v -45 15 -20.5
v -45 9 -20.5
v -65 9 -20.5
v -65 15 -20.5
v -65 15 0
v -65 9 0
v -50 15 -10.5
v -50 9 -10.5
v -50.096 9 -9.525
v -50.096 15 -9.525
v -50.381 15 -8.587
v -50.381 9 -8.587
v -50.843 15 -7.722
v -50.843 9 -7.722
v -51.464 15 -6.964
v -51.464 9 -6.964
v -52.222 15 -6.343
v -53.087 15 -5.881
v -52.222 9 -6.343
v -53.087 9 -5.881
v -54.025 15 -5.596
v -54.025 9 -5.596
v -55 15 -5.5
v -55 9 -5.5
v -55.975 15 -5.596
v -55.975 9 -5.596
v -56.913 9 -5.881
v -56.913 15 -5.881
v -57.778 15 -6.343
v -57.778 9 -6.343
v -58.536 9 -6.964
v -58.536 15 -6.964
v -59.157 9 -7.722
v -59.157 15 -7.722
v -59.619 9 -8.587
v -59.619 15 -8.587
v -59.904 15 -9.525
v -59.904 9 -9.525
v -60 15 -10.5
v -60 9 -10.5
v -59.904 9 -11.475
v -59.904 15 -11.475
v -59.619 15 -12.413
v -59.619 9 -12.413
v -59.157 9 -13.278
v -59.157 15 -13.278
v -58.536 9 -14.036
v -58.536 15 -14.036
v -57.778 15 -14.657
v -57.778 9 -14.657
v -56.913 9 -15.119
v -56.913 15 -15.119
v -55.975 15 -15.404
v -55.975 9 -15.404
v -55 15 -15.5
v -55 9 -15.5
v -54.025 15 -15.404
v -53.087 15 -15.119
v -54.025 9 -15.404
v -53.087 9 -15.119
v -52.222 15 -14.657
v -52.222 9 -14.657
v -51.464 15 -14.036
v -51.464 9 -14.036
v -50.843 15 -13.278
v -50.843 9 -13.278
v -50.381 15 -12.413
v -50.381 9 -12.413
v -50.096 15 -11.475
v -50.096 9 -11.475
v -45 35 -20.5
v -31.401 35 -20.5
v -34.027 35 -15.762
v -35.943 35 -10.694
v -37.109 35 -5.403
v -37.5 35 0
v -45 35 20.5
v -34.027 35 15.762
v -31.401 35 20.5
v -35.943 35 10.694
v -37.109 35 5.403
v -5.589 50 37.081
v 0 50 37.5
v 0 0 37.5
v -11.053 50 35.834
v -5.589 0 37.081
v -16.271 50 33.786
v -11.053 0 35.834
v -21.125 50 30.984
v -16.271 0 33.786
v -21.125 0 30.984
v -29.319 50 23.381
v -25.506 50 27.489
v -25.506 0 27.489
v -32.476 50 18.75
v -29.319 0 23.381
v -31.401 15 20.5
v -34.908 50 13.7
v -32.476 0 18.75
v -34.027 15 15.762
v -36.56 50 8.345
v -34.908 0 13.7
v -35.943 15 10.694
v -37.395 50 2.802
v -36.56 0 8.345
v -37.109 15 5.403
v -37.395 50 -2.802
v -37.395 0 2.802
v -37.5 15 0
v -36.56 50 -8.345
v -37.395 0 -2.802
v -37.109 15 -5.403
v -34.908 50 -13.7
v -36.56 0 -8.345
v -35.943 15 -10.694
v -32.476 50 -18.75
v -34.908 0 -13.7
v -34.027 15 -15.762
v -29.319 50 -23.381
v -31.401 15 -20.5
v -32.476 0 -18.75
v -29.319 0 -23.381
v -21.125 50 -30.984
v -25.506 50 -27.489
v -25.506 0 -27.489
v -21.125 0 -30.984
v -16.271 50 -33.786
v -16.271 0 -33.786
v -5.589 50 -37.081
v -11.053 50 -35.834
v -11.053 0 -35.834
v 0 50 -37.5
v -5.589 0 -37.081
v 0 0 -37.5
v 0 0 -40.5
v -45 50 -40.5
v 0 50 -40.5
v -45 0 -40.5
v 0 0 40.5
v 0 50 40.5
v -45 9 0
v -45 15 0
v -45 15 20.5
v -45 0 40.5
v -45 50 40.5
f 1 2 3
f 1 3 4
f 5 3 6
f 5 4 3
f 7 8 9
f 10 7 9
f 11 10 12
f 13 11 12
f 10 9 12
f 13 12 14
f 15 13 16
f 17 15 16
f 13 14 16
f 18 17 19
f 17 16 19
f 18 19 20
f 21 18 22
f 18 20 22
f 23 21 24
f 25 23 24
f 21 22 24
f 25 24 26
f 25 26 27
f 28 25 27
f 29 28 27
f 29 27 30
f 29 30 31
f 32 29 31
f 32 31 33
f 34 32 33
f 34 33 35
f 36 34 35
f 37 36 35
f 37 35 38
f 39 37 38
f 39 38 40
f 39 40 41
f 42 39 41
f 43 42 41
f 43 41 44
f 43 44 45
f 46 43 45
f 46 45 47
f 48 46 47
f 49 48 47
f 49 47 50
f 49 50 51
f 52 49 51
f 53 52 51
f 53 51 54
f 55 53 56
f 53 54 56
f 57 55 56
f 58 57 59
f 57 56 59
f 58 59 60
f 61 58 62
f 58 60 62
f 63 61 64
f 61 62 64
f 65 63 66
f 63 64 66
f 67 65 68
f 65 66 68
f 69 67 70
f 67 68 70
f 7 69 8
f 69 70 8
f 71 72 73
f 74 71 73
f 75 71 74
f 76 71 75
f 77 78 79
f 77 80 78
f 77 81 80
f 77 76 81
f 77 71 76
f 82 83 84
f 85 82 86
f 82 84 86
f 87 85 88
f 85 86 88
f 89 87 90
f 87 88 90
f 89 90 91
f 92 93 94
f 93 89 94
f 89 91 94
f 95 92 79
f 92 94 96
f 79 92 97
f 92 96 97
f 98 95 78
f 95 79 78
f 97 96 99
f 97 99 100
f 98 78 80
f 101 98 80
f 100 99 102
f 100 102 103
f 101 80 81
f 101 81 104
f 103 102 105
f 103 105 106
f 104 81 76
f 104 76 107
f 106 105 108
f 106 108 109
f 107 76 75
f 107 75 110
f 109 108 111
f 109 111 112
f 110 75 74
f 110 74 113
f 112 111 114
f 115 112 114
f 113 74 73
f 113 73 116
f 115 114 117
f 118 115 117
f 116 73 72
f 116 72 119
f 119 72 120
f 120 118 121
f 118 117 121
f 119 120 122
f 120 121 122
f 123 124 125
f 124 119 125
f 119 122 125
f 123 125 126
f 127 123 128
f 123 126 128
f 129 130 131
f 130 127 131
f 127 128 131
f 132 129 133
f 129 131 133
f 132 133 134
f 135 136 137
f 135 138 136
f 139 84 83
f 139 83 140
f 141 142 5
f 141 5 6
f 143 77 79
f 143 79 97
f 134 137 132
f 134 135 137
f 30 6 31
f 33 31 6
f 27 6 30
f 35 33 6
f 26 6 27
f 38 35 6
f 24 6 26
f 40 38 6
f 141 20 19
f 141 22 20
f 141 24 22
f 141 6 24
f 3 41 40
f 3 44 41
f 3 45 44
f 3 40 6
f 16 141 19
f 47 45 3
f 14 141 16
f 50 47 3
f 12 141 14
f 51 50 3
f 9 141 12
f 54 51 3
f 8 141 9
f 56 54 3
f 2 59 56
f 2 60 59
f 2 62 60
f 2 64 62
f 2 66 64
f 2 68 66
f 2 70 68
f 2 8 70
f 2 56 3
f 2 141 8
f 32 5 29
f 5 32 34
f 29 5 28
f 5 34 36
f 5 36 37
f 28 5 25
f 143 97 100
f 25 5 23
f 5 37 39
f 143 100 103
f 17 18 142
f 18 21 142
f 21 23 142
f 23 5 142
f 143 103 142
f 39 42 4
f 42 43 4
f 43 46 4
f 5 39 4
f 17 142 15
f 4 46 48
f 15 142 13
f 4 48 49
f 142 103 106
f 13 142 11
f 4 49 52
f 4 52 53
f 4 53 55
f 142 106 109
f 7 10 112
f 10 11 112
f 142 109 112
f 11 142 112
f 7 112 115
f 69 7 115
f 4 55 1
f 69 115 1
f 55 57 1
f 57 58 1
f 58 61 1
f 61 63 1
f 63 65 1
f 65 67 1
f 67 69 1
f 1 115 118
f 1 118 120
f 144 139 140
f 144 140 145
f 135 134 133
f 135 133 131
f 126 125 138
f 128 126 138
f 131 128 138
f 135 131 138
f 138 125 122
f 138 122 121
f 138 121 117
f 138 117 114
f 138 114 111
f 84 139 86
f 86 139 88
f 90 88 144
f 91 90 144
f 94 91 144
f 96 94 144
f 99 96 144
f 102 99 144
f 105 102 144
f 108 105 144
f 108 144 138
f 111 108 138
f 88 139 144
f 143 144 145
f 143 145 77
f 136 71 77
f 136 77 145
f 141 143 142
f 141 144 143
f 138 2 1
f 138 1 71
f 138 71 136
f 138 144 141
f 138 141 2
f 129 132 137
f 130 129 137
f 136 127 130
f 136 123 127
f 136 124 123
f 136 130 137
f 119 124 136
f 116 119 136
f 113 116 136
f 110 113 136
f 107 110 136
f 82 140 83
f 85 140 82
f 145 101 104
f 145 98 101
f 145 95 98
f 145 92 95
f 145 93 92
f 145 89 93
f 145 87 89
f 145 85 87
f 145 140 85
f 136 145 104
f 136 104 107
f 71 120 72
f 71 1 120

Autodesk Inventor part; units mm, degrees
ref_plane "YZ Plane" through (0, 0, 0) normal (1, 0, 0) x (0, 1, 0)
ref_plane "XZ Plane" through (0, 0, 0) normal (0, 1, 0) x (-1, 0, 0)
ref_plane "XY Plane" through (0, 0, 0) normal (0, 0, 1) x (1, 0, 0)
sketch "Esquisse2" plane through (0, 0, 0) normal (0, 1, 0) x (-1, 0, 0)
  circle A0 centre (0, 0) radius 37.5
  line L0 (45, 37.5) -> (45, -37.5)
  line L1 (45, -37.5) -> (45, -40.5)
  line L2 (45, -40.5) -> (0, -40.5)
  line L3 (0, -40.5) -> (0, -37.5)
  line L4 (0, 37.5) -> (0, 40.5)
  line L5 (0, 40.5) -> (45, 40.5)
  line L6 (45, 40.5) -> (45, 37.5)
  point P0 (22.5, 40.5)
  dimension "d0" = 75
  dimension "d4" = 81
  dimension "d13" = 45
  dimension "d14" = 45
extrude "Extrusion1" add sketch "Esquisse2" along normal blind 50 contours A0 L4 L5 L6 L0 L1 L2 L3
sketch "Esquisse3" plane through (-45, 0, -40.5) normal (-1, 0, 0) x (0, 0, 1)
  line L0 (61, 15) -> (20, 15)
  line L1 (20, 15) -> (20, 35)
  line L2 (20, 35) -> (61, 35)
  line L3 (61, 35) -> (61, 15)
  line L4 (81, 0) -> (81, 50) projected
  line L5 (0, 0) -> (0, 50) projected
  line L6 (0, 0) -> (81, 0) projected
  line L7 (0, 50) -> (81, 50) projected
  point P0 (40.5, 0)
  point P1 (61, 25)
  dimension "d7" = 20
  dimension "d8" = 20
  dimension "d9" = 15
  dimension "d10" = 15
extrude "Extrusion2" cut sketch "Esquisse3" against normal blind 50 contours L0 L1 L2 L3
sketch "Esquisse4" plane through (-45, 0, -40.5) normal (-1, 0, 0) x (0, 0, 1)
  line L0 (61, 15) -> (20, 15) projected
  line L1 (20, 15) -> (40.5, 15)
  line L2 (40.5, 15) -> (40.5, 9)
  line L3 (40.5, 9) -> (20, 9)
  line L4 (20, 9) -> (20, 15)
  point P0 (40.5, 0)
extrude "Extrusion3" add sketch "Esquisse4" along normal blind 20
sketch "Esquisse5" plane through (-45, 9, -20.5) normal (0, -1, 0) x (1, 0, 0)
  circle A0 centre (-10, 10) radius 5
  point P0 (45, 20.5)
  dimension "d17" = 10
extrude "Extrusion4" cut sketch "Esquisse5" against normal blind 20
properties part number "corps_pince_aimant"
